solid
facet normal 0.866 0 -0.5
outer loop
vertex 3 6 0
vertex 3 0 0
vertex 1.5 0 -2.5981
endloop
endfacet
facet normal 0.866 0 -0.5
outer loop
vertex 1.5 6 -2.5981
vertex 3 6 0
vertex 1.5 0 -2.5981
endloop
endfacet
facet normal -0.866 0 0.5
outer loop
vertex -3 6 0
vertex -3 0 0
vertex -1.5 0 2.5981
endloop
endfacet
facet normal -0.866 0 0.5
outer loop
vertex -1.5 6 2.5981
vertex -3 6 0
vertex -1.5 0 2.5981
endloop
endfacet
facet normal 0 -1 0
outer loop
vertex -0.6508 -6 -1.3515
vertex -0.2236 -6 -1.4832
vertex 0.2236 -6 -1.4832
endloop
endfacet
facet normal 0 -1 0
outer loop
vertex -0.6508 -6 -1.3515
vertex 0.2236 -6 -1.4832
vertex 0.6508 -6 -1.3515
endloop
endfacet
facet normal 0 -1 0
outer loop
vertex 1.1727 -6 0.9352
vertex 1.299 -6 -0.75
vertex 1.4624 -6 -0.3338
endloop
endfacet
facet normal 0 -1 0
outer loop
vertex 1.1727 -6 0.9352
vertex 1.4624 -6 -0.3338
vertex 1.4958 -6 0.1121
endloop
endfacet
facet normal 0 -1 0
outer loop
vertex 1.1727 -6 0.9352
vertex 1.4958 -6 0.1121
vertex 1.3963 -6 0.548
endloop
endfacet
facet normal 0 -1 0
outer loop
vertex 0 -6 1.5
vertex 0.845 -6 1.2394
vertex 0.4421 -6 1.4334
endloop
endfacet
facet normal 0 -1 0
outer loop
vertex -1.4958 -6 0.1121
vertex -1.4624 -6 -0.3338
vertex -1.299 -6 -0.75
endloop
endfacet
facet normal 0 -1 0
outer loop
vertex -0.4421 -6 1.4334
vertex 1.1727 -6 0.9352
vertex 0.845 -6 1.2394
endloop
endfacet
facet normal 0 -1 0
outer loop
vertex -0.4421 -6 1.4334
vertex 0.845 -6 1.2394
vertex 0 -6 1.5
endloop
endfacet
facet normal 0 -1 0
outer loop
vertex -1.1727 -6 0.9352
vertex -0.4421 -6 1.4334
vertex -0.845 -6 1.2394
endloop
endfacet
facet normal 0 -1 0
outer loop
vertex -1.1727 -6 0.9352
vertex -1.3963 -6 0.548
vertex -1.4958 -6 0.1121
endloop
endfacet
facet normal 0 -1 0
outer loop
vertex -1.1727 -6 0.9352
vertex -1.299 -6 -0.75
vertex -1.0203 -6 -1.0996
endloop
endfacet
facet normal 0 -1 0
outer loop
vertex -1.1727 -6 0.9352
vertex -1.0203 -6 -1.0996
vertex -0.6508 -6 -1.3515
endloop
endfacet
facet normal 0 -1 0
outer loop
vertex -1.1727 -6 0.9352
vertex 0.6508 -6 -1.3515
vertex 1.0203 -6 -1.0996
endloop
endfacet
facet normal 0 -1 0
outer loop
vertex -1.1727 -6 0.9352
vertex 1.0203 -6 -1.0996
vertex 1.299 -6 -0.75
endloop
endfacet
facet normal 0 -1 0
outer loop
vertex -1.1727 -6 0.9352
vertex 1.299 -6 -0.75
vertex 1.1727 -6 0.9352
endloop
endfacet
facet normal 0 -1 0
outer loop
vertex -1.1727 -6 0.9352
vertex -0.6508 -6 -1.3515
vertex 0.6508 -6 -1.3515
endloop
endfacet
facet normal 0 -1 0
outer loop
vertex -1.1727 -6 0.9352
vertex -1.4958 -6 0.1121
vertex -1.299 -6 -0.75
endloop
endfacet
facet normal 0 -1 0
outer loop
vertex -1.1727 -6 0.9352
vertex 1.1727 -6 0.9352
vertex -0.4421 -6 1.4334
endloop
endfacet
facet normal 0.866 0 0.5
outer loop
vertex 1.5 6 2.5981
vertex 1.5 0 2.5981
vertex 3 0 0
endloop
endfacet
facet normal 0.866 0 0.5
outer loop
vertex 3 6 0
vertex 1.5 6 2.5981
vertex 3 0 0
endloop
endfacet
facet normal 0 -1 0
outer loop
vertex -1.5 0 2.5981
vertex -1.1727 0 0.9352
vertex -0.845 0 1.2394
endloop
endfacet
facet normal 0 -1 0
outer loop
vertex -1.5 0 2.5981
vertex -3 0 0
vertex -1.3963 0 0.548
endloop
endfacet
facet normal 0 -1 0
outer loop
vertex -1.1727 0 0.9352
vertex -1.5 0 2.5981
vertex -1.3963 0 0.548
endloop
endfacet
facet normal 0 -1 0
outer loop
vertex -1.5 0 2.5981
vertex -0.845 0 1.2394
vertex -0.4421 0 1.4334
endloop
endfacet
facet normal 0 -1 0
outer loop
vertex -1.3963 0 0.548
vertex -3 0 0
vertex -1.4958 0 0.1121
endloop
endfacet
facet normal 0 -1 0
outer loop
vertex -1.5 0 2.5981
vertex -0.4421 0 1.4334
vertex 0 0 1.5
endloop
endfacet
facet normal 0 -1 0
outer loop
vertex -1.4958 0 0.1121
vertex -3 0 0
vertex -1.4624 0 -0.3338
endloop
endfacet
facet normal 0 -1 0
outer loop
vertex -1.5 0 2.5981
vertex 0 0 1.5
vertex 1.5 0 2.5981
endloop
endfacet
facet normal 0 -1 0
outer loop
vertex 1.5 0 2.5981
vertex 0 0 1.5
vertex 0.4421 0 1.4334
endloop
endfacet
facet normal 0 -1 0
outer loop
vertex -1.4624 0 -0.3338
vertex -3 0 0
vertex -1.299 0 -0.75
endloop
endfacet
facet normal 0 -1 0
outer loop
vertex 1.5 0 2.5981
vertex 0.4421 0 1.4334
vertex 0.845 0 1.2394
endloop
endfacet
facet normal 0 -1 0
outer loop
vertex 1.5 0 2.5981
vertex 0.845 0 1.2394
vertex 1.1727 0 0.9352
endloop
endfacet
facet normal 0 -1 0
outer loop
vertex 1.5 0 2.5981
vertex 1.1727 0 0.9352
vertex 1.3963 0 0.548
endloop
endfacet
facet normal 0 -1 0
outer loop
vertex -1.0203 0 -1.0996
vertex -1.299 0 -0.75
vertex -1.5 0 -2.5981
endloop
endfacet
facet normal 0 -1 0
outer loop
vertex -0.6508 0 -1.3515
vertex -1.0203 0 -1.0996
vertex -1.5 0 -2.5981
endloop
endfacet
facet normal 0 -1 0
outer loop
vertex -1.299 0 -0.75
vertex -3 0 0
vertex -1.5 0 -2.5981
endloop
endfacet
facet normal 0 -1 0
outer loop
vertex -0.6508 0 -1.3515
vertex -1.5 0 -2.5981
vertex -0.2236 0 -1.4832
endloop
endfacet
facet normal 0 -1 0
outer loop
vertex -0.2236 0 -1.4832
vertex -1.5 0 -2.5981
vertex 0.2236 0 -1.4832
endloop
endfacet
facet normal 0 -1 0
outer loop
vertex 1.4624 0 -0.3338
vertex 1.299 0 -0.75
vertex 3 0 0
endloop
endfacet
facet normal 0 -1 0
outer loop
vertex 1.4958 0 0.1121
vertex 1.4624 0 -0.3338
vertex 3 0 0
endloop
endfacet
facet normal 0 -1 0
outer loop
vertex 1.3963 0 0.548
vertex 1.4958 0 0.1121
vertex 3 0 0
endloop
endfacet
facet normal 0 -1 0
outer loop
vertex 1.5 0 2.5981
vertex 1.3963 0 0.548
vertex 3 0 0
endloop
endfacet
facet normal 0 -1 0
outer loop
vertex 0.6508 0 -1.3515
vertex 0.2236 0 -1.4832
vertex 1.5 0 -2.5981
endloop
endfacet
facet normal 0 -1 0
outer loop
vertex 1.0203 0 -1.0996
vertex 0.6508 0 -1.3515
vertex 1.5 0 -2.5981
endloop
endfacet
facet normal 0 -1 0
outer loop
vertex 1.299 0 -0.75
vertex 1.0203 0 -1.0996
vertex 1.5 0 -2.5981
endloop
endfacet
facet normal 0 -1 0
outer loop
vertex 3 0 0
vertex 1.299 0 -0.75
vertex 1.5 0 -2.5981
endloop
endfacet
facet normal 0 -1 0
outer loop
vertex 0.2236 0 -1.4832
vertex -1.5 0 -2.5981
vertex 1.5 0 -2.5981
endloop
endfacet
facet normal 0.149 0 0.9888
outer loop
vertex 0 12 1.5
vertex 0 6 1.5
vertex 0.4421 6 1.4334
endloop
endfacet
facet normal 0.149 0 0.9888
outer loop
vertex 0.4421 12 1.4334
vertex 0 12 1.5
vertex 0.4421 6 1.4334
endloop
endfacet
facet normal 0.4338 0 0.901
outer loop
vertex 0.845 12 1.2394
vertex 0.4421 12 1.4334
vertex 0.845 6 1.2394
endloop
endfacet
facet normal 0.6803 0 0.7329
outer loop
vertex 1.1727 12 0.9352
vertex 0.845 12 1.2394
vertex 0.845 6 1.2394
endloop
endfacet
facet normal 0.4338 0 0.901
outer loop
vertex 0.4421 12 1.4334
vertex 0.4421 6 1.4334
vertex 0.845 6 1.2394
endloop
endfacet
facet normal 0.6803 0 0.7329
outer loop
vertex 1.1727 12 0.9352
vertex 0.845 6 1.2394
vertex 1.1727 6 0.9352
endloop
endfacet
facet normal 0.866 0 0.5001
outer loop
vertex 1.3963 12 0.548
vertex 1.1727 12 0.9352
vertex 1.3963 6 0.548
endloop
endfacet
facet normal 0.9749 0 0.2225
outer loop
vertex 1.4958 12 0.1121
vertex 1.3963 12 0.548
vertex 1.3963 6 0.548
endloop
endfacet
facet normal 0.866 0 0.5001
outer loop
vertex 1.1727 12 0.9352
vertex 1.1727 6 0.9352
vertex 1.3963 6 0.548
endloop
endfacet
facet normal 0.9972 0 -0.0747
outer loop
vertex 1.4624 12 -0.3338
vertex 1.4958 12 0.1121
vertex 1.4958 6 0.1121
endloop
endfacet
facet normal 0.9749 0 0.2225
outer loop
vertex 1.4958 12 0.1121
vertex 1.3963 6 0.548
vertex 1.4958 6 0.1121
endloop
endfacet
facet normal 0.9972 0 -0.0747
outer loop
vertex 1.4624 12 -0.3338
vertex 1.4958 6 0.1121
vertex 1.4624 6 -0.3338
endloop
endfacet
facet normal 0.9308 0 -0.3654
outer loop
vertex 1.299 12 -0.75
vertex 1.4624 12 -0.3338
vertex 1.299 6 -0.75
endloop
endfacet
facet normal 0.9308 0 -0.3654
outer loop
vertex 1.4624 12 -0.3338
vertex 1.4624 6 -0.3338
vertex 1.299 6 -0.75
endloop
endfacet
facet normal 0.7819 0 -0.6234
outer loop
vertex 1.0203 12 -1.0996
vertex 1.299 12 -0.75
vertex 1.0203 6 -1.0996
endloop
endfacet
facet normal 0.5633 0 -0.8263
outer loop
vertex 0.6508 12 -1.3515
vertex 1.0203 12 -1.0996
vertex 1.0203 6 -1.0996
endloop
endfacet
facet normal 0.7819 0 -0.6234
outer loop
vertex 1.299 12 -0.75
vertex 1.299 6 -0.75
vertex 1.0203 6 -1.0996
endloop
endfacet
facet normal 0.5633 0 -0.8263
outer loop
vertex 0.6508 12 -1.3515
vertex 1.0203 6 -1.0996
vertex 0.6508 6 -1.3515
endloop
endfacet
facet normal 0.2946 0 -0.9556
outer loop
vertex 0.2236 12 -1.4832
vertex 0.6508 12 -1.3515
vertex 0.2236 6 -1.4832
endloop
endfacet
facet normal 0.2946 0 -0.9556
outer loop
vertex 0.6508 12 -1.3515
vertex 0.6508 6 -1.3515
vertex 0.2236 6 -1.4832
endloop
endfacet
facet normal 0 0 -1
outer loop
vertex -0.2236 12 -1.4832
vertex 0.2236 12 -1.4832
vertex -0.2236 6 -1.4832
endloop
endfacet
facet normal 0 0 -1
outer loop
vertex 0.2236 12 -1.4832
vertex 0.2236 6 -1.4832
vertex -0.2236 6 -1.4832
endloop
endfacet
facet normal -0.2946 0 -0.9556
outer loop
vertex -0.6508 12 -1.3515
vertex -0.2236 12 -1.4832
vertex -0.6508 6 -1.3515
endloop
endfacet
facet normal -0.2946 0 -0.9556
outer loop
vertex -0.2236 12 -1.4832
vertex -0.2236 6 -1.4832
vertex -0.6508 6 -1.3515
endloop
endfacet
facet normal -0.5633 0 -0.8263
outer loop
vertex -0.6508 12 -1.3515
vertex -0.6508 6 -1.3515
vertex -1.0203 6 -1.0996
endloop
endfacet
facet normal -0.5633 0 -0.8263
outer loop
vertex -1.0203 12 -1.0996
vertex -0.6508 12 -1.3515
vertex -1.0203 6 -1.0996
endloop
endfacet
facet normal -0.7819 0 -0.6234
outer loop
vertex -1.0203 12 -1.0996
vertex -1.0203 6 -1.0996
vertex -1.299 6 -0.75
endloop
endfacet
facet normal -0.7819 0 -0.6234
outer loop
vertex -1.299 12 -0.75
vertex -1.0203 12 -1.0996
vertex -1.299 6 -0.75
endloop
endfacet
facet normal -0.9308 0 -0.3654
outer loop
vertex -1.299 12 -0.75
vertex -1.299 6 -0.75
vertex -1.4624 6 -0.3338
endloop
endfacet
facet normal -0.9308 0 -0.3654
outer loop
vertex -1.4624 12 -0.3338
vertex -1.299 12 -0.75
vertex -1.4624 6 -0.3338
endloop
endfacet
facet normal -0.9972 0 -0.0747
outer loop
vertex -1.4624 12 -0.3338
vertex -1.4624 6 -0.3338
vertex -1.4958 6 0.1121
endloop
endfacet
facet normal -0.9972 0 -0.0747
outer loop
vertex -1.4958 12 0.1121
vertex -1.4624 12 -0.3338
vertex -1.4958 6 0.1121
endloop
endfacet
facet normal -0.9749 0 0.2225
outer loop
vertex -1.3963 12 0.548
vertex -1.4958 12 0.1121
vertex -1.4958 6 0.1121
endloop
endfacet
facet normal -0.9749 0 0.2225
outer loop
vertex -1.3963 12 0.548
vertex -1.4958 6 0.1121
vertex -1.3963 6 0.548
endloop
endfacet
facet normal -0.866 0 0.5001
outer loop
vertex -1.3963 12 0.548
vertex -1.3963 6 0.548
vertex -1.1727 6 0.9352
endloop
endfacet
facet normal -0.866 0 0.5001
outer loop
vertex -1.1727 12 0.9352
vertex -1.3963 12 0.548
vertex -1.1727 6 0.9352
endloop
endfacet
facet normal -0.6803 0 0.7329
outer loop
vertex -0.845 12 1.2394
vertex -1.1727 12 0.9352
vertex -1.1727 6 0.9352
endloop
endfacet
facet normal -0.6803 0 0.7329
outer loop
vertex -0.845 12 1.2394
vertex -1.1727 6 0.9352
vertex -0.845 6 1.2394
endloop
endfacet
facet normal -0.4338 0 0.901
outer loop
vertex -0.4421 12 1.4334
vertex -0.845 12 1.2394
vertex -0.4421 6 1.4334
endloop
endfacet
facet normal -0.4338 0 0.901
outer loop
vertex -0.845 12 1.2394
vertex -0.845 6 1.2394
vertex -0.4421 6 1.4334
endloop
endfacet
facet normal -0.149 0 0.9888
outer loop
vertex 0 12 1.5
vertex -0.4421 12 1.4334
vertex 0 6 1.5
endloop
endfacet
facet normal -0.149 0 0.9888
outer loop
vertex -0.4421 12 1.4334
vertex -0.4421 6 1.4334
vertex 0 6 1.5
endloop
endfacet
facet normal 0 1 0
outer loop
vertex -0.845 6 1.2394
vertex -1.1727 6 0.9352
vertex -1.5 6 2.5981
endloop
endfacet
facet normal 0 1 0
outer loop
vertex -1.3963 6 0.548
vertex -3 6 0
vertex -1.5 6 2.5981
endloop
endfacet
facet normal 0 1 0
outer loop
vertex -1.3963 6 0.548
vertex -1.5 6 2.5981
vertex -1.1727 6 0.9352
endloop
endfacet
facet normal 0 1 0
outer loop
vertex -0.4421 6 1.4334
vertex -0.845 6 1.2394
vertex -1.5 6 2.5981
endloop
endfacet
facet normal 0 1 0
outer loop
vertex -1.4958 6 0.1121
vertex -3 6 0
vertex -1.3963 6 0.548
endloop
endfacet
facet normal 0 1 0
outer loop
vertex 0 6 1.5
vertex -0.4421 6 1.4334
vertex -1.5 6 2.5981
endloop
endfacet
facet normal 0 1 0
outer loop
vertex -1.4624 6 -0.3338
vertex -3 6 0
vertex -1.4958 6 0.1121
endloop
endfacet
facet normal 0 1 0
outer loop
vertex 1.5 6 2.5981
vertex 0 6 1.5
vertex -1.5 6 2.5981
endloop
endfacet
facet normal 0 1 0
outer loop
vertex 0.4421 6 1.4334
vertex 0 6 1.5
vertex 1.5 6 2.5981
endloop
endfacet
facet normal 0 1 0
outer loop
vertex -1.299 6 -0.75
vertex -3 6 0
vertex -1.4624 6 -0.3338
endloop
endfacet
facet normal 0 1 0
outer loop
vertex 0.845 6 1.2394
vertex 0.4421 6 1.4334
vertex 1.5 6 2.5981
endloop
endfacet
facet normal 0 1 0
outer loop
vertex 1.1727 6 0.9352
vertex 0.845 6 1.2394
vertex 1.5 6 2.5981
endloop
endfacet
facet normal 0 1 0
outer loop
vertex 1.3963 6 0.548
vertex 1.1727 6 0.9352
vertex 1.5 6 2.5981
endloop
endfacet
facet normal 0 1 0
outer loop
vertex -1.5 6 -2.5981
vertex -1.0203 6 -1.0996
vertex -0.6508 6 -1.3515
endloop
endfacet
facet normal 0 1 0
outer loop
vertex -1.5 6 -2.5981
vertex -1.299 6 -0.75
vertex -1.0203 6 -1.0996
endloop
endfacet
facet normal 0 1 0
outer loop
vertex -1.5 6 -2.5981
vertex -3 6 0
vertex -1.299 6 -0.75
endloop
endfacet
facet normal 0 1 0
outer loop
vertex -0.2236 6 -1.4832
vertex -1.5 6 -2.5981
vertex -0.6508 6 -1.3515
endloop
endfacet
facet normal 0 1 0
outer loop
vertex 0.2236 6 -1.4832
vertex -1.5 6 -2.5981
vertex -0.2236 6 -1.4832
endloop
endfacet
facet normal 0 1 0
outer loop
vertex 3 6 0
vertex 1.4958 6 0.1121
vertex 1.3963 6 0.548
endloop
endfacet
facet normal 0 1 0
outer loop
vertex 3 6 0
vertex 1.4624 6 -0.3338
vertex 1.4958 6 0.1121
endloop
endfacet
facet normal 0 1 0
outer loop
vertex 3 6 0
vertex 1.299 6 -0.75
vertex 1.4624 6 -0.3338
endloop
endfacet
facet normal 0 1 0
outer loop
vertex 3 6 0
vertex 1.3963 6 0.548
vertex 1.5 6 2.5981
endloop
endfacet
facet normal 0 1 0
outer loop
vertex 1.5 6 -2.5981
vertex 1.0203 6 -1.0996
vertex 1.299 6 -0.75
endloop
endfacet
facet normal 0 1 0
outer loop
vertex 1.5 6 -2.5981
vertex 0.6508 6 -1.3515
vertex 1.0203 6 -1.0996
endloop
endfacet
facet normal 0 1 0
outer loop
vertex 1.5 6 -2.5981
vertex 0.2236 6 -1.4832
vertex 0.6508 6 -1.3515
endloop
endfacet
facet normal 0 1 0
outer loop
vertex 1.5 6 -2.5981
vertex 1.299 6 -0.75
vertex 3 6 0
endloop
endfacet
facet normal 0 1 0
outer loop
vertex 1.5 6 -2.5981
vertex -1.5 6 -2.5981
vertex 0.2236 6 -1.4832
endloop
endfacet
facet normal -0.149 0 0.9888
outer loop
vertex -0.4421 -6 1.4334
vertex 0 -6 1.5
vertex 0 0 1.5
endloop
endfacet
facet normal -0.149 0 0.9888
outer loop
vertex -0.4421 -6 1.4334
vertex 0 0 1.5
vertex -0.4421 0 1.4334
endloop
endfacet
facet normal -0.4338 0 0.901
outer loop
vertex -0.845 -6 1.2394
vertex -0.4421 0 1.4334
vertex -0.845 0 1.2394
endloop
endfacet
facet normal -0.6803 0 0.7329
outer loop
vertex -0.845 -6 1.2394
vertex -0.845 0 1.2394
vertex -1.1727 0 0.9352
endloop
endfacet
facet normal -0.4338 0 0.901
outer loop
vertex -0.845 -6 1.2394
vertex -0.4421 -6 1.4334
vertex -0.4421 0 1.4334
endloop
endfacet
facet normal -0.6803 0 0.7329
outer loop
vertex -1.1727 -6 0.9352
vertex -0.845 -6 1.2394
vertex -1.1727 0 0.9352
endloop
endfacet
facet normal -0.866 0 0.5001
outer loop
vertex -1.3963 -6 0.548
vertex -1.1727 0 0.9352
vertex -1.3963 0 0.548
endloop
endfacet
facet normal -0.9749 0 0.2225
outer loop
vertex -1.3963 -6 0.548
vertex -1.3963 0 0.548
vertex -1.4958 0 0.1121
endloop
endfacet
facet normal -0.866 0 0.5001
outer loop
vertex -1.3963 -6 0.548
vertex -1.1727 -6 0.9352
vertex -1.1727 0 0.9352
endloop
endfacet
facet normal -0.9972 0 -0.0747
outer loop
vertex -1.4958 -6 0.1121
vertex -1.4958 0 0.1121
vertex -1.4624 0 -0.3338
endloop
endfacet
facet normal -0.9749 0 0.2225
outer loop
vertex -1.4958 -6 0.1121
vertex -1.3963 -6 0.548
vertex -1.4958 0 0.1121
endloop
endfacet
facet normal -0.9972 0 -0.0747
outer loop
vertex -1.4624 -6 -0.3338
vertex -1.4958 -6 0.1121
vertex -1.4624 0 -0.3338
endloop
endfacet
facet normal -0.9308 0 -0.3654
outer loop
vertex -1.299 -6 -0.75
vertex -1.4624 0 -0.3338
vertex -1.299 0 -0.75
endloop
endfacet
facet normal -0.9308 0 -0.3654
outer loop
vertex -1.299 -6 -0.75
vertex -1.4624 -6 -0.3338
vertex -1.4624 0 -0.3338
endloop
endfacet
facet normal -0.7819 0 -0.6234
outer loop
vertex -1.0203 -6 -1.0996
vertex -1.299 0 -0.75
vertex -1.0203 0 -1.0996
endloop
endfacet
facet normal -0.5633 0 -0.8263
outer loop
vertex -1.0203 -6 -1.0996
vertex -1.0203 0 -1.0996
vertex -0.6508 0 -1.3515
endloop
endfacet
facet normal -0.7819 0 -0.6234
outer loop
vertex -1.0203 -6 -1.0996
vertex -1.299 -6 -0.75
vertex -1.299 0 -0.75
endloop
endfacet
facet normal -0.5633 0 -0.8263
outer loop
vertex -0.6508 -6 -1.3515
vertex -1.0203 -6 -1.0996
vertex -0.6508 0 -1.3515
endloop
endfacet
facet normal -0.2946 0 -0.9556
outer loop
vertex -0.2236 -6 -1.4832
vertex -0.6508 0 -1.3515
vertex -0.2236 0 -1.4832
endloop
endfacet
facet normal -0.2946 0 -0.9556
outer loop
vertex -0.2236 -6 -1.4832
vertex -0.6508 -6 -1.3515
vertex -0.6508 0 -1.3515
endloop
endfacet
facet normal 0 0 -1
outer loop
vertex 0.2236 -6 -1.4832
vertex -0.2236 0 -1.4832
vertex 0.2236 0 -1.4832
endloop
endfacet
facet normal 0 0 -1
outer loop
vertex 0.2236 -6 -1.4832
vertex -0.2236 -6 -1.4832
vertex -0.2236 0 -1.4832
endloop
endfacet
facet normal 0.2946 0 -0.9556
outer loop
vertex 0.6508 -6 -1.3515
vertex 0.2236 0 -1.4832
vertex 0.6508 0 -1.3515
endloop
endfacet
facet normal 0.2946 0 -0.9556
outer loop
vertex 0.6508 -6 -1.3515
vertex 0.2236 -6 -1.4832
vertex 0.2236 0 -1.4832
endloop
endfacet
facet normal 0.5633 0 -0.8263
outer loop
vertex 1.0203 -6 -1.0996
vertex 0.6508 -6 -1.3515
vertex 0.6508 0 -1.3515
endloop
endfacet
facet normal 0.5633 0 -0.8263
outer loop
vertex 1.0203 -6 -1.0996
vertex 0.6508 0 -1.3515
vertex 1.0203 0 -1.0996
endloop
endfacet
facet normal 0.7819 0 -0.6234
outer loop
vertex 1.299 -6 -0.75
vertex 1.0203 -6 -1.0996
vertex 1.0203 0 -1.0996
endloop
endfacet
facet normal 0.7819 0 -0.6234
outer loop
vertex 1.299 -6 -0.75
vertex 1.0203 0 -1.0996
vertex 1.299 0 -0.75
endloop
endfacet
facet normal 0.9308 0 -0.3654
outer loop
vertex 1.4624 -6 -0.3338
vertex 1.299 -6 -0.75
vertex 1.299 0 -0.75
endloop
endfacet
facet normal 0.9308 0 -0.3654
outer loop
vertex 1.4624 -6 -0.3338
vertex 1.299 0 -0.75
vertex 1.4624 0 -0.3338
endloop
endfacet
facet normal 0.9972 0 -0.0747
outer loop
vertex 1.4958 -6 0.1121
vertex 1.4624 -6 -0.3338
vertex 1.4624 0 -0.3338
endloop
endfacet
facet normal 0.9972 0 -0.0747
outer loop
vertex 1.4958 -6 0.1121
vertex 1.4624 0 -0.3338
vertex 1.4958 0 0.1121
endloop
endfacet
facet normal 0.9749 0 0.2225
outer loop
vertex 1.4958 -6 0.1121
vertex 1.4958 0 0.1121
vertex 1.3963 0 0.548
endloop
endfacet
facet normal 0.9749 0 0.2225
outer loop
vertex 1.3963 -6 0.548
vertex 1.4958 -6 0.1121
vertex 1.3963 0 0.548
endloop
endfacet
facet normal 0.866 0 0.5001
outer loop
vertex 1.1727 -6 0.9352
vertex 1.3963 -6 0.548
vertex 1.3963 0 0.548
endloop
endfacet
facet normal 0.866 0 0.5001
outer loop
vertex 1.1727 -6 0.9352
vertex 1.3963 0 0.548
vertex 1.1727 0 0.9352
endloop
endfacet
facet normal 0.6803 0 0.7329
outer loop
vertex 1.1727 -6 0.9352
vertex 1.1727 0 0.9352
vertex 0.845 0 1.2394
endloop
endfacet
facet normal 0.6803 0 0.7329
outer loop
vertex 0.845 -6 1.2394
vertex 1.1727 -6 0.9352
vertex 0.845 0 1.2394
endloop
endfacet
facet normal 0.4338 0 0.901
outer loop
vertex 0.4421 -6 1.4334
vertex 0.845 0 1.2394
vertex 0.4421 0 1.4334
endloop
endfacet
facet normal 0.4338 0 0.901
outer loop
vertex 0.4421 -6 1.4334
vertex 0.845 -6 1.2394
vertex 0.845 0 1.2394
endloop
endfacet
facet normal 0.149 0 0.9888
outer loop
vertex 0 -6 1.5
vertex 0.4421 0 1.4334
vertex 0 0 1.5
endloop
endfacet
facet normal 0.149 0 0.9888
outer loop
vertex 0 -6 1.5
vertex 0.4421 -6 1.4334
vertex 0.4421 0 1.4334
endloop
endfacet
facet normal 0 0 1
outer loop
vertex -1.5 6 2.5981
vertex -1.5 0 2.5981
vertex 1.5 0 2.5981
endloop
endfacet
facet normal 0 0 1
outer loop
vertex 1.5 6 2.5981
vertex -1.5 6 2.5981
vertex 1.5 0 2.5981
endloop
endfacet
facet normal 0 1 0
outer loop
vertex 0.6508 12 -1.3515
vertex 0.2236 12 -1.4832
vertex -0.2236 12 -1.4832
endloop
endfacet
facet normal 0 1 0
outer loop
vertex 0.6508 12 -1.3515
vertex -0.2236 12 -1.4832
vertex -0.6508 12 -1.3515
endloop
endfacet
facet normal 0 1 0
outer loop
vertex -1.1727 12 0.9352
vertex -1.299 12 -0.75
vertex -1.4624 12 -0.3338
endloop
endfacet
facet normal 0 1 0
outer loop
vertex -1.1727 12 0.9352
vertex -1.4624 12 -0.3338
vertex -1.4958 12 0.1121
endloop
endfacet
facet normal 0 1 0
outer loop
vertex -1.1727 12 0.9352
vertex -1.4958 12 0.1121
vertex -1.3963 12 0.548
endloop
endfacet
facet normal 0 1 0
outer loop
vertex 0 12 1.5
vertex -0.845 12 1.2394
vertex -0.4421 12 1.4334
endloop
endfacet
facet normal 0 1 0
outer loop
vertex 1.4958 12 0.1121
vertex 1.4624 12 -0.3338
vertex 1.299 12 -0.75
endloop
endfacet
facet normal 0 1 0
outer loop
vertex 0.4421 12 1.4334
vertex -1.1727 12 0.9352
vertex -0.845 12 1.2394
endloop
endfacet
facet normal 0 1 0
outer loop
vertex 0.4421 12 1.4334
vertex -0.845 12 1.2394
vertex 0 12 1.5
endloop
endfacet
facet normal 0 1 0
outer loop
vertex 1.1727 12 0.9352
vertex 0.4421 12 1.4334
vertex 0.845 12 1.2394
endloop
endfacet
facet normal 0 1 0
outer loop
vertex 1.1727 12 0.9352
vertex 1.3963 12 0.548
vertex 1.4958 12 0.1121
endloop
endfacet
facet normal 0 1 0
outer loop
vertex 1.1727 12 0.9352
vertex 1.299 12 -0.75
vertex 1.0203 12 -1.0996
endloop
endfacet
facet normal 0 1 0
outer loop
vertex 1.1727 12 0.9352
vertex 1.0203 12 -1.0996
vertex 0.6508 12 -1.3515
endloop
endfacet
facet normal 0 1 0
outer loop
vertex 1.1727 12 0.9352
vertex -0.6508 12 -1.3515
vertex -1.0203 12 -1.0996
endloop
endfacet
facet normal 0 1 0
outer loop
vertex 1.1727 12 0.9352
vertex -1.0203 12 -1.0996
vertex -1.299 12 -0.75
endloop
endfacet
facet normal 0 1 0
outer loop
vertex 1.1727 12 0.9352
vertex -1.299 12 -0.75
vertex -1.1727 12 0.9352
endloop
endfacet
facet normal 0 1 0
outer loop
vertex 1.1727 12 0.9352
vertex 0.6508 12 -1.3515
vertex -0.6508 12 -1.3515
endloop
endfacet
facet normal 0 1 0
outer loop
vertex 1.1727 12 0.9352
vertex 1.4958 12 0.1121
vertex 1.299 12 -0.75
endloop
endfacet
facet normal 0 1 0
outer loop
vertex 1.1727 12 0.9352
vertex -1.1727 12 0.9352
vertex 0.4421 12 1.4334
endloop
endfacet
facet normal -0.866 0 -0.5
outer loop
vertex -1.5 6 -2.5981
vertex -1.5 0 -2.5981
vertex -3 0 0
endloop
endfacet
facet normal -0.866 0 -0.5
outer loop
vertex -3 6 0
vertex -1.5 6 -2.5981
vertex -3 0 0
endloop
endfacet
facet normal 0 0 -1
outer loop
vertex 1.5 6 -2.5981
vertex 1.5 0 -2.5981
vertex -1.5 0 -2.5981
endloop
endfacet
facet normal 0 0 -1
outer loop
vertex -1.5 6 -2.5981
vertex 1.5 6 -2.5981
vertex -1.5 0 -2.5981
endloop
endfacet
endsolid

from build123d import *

# Parameters (mm, degrees)
EXTRUDE_1_DEPTH = 6
SKETCH_2_R      = 1.5
EXTRUDE_2_DEPTH = 6
EXTRUDE_START   = 6
SKETCH_3_R      = 1.5
EXTRUDE_3_DEPTH = 6


with BuildPart() as part:
    # 草图1 → 凸台-拉伸1 (new body)
    with BuildSketch(Plane(origin=(0, 0, 0), x_dir=(1, 0, 0), z_dir=(0, 1, 0))):
        Polygon((3, 0), (1.5, 2.598076211), (-1.5, 2.598076211), (-3, 0), (-1.5, -2.598076211), (1.5, -2.598076211), align=None)
    extrude(amount=EXTRUDE_1_DEPTH)

    # 草图2 → 凸台-拉伸2 (add)
    with BuildSketch(Plane(origin=(0, 6, 0), x_dir=(1, 0, 0), z_dir=(0, 1, 0))):
        with Locations(Location((0, 0, 0), (0, 0, 270))):
            Circle(SKETCH_2_R)
    extrude(amount=EXTRUDE_2_DEPTH)

    # 草图3 → 凸台-拉伸3 (add)
    with BuildSketch(Plane.XZ.offset(EXTRUDE_START)):
        with Locations(Location((0, 0, 0), (0, 0, 90))):
            Circle(SKETCH_3_R)
    extrude(amount=-EXTRUDE_3_DEPTH)


solid = part.part
